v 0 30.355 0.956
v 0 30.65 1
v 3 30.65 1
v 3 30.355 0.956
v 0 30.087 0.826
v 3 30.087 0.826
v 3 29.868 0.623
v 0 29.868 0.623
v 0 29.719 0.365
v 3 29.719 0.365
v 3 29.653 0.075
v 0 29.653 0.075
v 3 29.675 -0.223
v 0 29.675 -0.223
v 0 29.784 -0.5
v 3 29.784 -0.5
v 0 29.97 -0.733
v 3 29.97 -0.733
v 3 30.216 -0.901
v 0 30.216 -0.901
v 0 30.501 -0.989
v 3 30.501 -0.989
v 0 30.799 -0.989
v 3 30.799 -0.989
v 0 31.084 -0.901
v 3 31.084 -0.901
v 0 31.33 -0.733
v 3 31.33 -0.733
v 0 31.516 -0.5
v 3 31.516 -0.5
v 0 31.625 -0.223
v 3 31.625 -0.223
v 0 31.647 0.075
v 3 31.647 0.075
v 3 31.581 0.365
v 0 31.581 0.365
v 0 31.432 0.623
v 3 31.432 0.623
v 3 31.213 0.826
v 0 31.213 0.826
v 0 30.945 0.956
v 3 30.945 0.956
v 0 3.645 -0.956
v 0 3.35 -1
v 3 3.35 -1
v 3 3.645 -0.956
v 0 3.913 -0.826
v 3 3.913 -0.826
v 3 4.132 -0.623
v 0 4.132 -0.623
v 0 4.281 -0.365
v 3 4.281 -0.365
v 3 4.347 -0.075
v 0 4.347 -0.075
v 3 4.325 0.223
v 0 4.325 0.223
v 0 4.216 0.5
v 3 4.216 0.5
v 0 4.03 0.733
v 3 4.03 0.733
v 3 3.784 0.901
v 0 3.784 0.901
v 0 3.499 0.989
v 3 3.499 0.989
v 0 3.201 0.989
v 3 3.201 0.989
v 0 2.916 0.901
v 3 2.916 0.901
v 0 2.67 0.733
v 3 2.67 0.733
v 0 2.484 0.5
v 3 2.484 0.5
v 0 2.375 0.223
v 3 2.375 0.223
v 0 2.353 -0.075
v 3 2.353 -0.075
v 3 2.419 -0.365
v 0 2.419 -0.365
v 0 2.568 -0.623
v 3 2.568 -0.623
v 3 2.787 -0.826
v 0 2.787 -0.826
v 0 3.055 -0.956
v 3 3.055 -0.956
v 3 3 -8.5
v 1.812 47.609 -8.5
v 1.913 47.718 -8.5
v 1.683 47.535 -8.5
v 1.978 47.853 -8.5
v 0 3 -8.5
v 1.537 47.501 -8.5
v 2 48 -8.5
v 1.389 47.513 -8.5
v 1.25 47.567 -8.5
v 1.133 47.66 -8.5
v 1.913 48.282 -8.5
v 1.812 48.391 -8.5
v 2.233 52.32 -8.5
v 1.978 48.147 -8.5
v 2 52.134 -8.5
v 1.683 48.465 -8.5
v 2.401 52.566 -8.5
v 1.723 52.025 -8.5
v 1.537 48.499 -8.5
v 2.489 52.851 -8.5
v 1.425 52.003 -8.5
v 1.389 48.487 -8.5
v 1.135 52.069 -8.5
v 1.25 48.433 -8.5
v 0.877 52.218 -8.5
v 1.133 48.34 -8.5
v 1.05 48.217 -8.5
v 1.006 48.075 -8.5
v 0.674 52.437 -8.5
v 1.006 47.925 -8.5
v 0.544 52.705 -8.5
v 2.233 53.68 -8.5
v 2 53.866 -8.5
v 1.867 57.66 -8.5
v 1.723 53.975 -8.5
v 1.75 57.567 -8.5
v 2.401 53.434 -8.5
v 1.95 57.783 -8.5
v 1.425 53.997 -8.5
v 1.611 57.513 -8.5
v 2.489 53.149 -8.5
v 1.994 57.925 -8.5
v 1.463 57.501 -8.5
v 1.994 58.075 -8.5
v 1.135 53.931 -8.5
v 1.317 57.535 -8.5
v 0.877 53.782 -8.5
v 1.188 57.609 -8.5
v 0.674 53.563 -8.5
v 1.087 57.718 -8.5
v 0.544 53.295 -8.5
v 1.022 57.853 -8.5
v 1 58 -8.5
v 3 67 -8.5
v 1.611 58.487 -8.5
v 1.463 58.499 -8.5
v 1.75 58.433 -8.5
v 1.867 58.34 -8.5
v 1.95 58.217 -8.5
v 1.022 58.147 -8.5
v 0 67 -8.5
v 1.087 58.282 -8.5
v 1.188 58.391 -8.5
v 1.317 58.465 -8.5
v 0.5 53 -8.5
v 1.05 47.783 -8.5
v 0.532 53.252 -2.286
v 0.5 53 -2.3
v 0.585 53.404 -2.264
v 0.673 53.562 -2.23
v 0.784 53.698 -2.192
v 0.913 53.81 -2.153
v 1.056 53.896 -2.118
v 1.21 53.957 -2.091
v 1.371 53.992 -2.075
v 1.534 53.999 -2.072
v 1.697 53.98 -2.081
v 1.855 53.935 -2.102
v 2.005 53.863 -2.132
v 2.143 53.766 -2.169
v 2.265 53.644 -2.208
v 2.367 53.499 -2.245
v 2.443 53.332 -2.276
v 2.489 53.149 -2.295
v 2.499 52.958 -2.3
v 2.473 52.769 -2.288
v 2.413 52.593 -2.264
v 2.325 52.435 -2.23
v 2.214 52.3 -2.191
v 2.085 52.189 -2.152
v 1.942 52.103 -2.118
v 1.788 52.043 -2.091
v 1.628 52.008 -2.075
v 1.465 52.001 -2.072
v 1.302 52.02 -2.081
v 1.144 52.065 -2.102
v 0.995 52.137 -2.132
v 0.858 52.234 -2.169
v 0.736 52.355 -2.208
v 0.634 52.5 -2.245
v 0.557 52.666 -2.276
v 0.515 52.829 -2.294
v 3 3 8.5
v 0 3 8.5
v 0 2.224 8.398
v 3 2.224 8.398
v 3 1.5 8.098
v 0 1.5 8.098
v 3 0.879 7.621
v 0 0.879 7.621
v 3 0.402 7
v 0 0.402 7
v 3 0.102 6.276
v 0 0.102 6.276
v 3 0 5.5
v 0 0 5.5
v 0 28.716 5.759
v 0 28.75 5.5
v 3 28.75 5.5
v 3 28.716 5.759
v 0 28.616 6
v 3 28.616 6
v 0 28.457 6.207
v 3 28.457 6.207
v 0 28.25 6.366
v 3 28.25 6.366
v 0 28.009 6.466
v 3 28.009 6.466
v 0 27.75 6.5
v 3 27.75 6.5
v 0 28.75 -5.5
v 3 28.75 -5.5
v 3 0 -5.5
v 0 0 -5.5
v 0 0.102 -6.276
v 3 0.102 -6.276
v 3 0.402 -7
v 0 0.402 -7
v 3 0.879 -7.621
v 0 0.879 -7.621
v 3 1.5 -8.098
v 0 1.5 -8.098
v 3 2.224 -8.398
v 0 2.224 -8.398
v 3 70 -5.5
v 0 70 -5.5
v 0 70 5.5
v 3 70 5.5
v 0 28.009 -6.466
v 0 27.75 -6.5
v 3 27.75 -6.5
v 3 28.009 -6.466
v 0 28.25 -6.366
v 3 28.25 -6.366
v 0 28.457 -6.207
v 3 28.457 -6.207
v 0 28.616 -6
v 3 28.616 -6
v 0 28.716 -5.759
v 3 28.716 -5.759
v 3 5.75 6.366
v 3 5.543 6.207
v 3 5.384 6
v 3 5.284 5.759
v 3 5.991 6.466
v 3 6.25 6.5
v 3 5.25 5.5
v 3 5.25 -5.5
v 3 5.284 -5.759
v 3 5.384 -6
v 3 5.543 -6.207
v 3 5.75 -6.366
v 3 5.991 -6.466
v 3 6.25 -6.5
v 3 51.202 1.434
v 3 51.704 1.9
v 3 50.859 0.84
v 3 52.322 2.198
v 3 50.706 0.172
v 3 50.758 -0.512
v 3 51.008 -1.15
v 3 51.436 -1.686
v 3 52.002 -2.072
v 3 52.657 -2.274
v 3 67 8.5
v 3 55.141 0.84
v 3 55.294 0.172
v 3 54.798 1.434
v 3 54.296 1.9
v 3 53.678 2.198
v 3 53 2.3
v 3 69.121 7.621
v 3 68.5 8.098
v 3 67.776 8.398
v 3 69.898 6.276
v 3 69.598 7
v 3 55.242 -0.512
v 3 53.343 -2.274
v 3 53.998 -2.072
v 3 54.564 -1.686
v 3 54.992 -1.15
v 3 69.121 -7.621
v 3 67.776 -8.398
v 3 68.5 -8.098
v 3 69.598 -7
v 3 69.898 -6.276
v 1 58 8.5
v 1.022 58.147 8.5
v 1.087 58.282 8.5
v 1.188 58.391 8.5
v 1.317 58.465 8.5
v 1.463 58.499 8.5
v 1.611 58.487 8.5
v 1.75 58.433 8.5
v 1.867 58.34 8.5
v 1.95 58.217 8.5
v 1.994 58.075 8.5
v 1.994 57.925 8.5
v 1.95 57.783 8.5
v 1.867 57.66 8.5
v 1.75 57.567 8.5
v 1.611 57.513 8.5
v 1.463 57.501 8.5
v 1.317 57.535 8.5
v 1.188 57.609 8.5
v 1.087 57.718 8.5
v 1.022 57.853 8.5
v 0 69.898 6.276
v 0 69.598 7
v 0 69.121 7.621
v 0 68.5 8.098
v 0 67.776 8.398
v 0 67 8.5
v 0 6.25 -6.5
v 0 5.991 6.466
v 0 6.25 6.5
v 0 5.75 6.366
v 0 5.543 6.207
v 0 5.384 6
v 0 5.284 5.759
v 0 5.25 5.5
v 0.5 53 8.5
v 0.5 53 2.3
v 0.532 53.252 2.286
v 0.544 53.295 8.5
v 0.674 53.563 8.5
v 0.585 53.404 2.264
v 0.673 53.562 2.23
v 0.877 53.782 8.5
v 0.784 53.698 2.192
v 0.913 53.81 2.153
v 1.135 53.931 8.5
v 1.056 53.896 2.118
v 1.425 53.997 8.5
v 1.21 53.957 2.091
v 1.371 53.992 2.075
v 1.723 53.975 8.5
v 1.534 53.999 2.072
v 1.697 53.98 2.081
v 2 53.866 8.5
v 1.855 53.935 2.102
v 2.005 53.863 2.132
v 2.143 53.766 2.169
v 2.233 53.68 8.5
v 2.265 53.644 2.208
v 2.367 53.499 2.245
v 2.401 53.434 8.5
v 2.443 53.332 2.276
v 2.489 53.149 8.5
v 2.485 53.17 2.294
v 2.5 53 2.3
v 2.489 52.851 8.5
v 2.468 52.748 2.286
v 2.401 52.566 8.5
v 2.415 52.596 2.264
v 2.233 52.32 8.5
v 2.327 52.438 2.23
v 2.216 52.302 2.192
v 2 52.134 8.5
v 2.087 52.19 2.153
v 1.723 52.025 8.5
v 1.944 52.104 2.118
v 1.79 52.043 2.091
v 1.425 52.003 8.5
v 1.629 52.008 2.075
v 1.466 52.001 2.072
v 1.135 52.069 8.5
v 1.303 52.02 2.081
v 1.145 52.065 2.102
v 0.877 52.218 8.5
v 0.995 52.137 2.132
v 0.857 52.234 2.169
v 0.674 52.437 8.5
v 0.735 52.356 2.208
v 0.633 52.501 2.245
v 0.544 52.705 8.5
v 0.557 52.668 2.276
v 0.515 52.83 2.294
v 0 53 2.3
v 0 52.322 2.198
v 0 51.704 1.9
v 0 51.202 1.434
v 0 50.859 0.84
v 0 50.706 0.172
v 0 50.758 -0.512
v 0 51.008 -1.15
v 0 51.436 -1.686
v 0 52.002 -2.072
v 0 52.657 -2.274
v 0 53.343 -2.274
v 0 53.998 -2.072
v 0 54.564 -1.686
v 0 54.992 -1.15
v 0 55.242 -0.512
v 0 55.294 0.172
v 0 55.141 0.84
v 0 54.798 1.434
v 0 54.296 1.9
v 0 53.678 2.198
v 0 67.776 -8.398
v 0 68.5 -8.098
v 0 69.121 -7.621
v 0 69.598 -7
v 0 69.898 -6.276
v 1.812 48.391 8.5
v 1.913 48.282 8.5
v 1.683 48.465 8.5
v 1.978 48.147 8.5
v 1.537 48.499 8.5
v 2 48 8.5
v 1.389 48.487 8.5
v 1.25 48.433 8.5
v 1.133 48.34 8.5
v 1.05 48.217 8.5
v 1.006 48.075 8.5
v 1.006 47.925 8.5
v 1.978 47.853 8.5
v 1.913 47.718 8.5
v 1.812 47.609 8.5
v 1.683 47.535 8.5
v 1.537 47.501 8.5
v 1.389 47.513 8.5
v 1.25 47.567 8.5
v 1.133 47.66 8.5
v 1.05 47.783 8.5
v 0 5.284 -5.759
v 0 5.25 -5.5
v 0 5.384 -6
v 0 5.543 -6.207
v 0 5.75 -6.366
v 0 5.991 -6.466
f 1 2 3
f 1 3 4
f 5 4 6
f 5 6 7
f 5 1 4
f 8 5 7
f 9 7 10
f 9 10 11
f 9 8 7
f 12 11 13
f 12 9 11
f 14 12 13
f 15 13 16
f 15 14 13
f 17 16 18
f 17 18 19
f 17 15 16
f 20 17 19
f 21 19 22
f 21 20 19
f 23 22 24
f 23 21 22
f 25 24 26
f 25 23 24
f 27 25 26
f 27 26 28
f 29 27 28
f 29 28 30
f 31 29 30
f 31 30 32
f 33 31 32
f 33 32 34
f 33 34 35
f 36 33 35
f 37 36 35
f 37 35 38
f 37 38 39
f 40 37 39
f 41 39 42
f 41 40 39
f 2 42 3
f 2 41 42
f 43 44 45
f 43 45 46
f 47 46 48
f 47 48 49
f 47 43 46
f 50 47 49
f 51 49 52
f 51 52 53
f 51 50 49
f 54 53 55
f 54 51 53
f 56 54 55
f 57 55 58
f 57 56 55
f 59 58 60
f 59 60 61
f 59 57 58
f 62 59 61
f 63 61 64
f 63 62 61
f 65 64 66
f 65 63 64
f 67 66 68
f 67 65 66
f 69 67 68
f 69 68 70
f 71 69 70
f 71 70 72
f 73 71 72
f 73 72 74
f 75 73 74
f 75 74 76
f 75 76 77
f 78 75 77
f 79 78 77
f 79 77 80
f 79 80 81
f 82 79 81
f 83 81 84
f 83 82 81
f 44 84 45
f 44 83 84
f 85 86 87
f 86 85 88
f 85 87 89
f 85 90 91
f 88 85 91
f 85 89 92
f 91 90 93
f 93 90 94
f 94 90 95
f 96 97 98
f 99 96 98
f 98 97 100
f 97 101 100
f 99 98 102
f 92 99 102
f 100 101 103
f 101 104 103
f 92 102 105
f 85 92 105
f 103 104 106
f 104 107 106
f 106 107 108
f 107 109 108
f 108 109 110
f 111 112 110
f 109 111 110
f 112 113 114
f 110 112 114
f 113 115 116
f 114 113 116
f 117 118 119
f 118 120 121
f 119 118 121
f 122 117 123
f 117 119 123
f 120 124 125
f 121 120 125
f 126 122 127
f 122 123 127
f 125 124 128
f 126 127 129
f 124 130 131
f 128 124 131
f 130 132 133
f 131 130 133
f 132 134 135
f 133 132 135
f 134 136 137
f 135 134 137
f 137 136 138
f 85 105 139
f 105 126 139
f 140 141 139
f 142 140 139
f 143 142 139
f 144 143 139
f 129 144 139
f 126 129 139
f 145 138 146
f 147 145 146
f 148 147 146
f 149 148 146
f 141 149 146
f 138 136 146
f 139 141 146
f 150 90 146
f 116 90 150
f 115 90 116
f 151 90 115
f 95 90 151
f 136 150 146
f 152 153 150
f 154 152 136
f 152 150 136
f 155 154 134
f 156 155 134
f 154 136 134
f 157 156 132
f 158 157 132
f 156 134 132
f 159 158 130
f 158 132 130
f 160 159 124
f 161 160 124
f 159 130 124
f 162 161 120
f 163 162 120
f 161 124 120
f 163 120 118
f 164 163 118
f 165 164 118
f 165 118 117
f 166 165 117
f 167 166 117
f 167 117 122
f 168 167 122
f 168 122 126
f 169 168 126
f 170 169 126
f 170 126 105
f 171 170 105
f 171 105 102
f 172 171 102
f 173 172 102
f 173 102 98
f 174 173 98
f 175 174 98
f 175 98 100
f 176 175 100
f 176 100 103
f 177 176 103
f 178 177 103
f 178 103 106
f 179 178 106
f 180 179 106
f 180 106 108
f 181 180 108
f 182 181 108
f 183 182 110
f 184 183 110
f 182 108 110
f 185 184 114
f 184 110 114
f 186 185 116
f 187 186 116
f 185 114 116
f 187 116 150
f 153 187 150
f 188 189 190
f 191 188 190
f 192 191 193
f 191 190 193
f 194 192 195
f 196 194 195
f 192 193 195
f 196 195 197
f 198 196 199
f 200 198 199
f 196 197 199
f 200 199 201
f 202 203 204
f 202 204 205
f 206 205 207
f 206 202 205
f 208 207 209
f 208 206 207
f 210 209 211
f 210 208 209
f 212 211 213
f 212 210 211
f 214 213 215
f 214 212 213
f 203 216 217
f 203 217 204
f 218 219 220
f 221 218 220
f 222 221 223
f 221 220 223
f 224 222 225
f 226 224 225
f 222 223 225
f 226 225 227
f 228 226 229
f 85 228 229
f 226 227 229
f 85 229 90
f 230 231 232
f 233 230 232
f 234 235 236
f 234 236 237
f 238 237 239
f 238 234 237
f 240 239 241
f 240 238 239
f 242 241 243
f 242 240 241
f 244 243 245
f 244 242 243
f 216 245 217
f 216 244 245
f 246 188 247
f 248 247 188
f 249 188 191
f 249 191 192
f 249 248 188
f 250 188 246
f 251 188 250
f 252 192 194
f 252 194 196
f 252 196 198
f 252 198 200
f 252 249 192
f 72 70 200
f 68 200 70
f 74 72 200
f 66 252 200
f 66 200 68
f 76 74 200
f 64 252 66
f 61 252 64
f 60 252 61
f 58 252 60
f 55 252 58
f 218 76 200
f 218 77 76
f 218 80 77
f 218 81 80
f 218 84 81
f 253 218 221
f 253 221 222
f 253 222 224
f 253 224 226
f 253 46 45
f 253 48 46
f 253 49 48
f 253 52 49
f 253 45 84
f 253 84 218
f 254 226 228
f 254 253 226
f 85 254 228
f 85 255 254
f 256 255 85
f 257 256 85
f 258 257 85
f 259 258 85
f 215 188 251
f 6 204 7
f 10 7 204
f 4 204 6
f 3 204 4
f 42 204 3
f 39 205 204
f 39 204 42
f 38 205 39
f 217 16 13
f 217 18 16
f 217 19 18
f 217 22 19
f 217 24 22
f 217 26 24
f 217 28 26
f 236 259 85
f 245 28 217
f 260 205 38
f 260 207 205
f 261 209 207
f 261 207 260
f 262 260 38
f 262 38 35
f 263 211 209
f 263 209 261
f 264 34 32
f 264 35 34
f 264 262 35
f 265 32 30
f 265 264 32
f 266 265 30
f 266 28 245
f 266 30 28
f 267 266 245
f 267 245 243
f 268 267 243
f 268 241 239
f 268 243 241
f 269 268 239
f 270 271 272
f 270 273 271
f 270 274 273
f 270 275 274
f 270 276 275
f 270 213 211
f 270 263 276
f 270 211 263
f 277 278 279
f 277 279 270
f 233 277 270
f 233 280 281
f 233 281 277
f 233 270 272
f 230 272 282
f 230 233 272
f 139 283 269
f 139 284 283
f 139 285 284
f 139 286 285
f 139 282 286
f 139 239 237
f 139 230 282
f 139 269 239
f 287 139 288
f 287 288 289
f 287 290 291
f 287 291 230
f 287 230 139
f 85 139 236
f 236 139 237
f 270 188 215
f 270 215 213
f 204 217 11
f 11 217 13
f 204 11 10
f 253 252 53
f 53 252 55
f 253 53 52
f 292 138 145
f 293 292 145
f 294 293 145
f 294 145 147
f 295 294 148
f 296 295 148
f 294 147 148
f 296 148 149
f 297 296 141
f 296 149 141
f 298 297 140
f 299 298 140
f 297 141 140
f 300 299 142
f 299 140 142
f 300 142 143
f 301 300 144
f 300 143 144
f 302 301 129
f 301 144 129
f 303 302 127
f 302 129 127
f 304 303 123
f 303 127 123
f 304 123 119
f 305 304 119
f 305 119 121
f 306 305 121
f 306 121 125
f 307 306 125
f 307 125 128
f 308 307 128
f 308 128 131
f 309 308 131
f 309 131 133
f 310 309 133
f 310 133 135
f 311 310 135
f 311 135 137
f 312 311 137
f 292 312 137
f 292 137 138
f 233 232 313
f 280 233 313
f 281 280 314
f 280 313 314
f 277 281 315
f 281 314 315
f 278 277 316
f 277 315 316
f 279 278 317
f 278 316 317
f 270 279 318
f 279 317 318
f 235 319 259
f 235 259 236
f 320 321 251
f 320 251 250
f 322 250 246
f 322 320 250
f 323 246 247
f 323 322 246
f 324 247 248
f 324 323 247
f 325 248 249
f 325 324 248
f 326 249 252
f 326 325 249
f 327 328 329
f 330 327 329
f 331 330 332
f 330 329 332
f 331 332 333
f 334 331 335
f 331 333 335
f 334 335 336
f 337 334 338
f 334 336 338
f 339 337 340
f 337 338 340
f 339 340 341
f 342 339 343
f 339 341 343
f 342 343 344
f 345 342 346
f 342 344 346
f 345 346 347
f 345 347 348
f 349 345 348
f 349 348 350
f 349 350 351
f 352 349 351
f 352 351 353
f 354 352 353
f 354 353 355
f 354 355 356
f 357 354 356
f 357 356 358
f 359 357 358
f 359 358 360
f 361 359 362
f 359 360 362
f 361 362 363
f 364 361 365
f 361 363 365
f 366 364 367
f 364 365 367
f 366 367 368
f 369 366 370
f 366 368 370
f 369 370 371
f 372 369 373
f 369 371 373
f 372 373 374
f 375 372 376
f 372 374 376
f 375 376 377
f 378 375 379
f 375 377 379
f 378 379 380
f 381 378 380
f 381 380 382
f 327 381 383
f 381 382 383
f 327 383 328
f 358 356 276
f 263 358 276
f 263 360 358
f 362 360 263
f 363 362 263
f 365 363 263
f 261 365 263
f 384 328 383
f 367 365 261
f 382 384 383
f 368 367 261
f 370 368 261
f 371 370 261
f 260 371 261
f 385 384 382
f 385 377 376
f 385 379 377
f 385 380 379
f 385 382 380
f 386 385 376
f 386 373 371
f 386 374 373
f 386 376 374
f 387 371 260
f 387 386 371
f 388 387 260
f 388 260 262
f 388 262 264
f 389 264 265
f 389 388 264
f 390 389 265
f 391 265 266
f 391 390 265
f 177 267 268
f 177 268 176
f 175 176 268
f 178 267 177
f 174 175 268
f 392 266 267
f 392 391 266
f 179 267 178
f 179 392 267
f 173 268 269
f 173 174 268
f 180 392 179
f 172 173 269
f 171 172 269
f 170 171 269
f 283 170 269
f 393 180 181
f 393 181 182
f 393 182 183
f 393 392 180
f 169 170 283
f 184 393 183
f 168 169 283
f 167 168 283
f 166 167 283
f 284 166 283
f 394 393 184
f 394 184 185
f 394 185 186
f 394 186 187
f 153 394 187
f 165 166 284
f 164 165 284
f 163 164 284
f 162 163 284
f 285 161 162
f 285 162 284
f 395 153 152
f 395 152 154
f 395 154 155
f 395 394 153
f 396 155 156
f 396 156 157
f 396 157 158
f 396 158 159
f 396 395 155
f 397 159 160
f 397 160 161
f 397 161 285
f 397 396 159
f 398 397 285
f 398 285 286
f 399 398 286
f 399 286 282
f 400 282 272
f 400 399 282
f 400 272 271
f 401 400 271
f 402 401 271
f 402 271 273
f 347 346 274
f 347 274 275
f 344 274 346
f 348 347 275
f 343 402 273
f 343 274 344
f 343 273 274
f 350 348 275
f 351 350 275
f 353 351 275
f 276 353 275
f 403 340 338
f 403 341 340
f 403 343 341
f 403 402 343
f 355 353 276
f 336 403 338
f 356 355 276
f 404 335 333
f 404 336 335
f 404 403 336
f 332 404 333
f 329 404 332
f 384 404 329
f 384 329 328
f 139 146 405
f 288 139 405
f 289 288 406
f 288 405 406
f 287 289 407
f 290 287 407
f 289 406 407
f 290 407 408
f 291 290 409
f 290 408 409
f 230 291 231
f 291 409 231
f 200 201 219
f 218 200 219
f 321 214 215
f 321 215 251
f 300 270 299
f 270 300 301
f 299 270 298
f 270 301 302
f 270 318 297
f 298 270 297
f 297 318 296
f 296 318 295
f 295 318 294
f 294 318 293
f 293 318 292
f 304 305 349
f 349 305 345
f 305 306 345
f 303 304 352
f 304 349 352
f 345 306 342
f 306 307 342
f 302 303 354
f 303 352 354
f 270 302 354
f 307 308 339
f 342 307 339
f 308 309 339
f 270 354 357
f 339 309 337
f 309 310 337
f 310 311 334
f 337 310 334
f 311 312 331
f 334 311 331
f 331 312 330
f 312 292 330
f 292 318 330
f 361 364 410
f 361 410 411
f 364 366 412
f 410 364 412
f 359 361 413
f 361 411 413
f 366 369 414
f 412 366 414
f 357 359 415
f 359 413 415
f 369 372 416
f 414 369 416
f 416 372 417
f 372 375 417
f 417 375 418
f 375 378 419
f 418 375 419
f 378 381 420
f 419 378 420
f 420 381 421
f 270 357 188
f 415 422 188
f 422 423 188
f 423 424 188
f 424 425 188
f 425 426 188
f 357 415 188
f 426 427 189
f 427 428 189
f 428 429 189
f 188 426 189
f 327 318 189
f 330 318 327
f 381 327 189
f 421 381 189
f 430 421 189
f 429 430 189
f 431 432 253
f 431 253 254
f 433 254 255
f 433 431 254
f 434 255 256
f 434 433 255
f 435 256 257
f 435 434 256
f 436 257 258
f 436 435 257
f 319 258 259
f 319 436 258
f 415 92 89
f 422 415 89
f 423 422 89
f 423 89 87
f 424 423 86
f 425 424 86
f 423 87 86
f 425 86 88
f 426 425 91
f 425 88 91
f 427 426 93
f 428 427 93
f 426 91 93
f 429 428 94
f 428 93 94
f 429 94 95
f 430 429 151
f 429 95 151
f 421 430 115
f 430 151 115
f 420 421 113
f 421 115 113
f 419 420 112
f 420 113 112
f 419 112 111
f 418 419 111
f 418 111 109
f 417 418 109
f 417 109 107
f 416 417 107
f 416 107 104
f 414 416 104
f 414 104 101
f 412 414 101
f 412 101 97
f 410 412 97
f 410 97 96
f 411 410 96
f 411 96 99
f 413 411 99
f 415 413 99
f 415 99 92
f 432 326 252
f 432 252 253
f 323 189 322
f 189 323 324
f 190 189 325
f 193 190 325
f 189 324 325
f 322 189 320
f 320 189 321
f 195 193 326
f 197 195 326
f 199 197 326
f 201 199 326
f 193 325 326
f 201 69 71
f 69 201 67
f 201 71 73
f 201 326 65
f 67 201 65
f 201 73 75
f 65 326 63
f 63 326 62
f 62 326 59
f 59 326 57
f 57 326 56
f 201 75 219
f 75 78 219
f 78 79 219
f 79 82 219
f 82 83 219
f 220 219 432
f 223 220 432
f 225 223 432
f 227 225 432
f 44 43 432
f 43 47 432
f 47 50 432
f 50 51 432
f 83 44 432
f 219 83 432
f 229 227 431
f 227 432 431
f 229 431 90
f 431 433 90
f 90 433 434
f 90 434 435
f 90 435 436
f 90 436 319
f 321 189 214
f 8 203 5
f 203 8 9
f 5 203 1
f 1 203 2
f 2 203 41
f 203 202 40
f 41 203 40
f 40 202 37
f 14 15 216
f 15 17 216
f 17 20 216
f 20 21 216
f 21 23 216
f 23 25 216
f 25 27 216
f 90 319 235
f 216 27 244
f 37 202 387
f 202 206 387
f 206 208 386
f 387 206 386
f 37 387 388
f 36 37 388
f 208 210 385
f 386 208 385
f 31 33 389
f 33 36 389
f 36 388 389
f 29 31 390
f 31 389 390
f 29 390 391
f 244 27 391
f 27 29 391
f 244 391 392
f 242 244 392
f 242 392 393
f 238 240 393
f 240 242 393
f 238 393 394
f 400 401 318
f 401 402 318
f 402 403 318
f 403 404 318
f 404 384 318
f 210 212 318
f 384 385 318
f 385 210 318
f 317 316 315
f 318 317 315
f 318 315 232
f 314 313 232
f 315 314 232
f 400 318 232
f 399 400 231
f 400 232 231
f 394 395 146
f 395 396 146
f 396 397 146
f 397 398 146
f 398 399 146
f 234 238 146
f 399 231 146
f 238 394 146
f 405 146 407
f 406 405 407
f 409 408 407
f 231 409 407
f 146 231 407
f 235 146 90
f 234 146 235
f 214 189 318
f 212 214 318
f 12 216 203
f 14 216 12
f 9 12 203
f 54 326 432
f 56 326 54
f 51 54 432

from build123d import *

# Parameters (mm, degrees)
SKETCH1_R           = 1
SKETCH1_R_2         = 2.3
BOSS_EXTRUDE1_DEPTH = 3
SKETCH2_R           = 0.5
SKETCH2_R_2         = 1
CUT_EXTRUDE1_DEPTH  = 73.097156671


with BuildPart() as part:
    # Sketch1 → Boss-Extrude1 (new body)
    with BuildSketch(Plane(origin=(0, 0, 0), x_dir=(0, 0, -1), z_dir=(1, 0, 0))):
        with BuildLine():
            Line((-5.5, 0), (5.5, 0))
            ThreePointArc((5.5, 0), (7.621320344, 0.878679656), (8.5, 3))
            Line((8.5, 3), (8.5, 67))
            ThreePointArc((8.5, 67), (7.621320344, 69.121320344), (5.5, 70))
            Line((5.5, 70), (-5.5, 70))
            ThreePointArc((-5.5, 70), (-7.621320344, 69.121320344), (-8.5, 67))
            Line((-8.5, 67), (-8.5, 3))
            ThreePointArc((-8.5, 3), (-7.621320344, 0.878679656), (-5.5, 0))
        make_face()
        with Locations((0, 3.35)):
            Circle(SKETCH1_R, mode=Mode.SUBTRACT)
        with Locations(Location((0, 30.65, 0), (0, 0, 180))):
            Circle(SKETCH1_R, mode=Mode.SUBTRACT)
        with Locations(Location((0, 53, 0), (0, 0, 180))):
            Circle(SKETCH1_R_2, mode=Mode.SUBTRACT)
        with BuildLine():
            Line((-6.5, 27.75), (-6.5, 6.25))
            ThreePointArc((-6.5, 6.25), (-6.207106781, 5.542893219), (-5.5, 5.25))
            Line((-5.5, 5.25), (5.5, 5.25))
            ThreePointArc((5.5, 5.25), (6.207106781, 5.542893219), (6.5, 6.25))
            Line((6.5, 6.25), (6.5, 27.75))
            ThreePointArc((6.5, 27.75), (6.207106781, 28.457106781), (5.5, 28.75))
            Line((5.5, 28.75), (-5.5, 28.75))
            ThreePointArc((-5.5, 28.75), (-6.207106781, 28.457106781), (-6.5, 27.75))
        make_face(mode=Mode.SUBTRACT)
    extrude(amount=BOSS_EXTRUDE1_DEPTH)

    # Sketch2 → Cut-Extrude1 (cut, through all)
    with BuildSketch(Plane(origin=(0, 0, -8.5), x_dir=(-1, 0, 0), z_dir=(0, 0, -1))):
        with Locations((-1.5, 58)):
            Circle(SKETCH2_R)
        with Locations(Location((-1.5, 48, 0), (0, 0, 180))):
            Circle(SKETCH2_R)
        with Locations((-1.5, 53)):
            Circle(SKETCH2_R_2)
    extrude(amount=-CUT_EXTRUDE1_DEPTH, mode=Mode.SUBTRACT)


solid = part.part
